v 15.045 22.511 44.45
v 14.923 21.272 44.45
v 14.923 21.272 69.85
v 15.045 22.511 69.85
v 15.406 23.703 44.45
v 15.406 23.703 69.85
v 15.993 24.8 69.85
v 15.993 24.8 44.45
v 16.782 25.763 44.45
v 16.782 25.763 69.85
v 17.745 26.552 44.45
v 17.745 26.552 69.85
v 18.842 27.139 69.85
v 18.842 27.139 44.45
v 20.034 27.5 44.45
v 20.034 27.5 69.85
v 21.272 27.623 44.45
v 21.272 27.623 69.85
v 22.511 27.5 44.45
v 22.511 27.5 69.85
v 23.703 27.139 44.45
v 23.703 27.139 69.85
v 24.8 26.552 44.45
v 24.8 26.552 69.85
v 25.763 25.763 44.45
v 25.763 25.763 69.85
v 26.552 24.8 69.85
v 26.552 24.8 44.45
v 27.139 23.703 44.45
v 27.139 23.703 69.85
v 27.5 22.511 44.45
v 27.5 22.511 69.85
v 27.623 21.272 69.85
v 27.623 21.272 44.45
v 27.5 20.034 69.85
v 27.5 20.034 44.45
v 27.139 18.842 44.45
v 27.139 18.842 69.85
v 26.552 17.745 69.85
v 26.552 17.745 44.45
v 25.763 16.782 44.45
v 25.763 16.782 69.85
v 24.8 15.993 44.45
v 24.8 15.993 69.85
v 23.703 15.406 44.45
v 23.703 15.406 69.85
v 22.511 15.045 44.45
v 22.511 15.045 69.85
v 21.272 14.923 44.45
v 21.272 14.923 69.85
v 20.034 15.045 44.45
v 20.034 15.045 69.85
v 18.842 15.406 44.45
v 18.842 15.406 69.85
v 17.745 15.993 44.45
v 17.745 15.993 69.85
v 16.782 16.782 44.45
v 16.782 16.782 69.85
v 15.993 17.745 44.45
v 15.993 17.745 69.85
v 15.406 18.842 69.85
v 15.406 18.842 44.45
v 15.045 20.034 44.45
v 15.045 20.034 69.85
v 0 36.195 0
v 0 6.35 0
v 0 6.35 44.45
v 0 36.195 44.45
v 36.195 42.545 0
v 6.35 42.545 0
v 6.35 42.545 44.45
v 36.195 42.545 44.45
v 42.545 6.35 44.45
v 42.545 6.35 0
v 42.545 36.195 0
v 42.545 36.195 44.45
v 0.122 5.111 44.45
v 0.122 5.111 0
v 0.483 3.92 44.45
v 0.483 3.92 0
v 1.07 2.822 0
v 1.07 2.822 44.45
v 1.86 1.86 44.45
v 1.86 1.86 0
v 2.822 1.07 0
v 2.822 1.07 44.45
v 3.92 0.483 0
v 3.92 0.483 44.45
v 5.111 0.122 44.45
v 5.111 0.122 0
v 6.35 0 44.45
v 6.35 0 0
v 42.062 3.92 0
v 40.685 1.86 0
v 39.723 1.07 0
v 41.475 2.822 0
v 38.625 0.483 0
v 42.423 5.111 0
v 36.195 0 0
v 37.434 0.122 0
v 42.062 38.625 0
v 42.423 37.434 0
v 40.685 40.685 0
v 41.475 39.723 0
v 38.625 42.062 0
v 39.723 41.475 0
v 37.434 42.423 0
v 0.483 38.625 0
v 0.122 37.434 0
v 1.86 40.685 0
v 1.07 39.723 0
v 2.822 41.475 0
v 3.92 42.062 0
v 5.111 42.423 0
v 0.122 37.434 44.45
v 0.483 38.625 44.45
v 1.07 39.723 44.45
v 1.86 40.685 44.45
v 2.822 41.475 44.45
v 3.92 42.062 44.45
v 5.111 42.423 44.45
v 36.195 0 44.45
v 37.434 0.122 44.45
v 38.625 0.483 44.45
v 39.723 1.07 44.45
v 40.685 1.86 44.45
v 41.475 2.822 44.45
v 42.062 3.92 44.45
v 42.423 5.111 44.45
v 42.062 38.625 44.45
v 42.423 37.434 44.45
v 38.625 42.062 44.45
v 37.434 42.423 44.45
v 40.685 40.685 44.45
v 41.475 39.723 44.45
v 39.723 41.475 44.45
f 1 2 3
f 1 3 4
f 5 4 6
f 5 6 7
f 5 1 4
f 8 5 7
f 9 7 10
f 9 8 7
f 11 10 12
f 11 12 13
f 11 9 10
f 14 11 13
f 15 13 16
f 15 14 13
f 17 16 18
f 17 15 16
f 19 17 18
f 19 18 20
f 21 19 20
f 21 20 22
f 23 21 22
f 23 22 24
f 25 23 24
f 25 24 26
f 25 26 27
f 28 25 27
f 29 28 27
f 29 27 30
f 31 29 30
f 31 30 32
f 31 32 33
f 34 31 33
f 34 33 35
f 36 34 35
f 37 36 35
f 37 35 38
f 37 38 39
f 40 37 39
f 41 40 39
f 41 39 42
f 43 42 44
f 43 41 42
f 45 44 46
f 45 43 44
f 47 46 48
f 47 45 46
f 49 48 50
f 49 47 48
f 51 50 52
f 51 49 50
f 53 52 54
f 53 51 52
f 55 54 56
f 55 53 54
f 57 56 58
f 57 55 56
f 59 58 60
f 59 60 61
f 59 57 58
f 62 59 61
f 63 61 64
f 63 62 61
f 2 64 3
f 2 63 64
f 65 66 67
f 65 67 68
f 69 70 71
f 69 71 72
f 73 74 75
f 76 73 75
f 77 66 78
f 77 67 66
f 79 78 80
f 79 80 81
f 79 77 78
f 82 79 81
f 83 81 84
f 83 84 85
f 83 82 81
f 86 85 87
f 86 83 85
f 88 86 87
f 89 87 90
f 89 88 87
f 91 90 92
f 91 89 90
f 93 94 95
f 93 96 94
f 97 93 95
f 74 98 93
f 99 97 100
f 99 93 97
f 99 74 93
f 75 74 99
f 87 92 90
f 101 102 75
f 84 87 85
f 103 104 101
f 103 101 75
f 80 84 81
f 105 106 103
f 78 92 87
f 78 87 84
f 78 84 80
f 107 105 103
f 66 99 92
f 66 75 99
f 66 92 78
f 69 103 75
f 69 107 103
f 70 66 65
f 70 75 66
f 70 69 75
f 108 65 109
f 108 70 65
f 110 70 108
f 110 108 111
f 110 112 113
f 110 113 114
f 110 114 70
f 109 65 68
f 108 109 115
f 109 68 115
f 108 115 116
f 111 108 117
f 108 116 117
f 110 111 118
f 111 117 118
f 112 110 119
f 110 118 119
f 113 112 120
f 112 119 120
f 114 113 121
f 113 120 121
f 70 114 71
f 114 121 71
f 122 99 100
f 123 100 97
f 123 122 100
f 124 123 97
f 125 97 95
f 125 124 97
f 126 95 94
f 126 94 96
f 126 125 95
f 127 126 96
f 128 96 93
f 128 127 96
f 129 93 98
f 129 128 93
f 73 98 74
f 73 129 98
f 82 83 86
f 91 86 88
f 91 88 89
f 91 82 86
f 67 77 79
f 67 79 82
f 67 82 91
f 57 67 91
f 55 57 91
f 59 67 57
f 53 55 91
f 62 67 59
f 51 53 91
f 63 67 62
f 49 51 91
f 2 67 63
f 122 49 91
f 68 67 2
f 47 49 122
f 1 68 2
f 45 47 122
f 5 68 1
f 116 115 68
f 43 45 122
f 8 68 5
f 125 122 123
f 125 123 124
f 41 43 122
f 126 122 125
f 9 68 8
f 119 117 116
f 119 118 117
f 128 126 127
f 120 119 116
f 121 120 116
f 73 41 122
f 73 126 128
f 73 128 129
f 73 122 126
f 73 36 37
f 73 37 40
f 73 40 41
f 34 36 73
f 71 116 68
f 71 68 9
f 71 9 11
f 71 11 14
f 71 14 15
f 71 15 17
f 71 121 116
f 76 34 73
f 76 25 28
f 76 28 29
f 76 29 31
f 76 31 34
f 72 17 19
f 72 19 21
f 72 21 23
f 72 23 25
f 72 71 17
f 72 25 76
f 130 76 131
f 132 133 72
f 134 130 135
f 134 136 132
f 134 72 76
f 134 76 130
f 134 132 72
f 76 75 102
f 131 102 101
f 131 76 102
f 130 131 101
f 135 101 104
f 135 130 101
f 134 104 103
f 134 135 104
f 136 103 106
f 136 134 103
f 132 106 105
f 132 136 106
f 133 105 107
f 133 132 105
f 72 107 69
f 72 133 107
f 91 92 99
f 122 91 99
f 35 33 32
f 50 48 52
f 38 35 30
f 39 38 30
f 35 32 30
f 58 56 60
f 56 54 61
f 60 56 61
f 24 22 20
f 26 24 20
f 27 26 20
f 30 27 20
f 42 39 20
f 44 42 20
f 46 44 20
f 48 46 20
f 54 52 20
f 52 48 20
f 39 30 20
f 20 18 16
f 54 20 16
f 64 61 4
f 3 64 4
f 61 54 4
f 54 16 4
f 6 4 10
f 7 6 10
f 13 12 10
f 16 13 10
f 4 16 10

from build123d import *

# Parameters (mm, degrees)
SKETCH1_W           = 42.545
SKETCH1_H           = 42.545
BOSS_EXTRUDE1_DEPTH = 44.45
FILLET2_R           = 6.35
SKETCH2_R           = 6.35
BOSS_EXTRUDE2_DEPTH = 69.85


with BuildPart() as part:
    # Sketch1 → Boss-Extrude1 (new body)
    with BuildSketch(Plane.XY):
        with Locations((21.2725, 21.2725)):
            Rectangle(SKETCH1_W, SKETCH1_H)
    extrude(amount=BOSS_EXTRUDE1_DEPTH)

    # Fillet2
    fillet2_edges = [part.edges().sort_by_distance(p)[0] for p in [
        (0, 42.545, 22.225),
        (42.545, 42.545, 22.225),
        (42.545, 0, 22.225),
        (0, 0, 22.225),
    ]]
    fillet(fillet2_edges, radius=FILLET2_R)

    # Sketch2 → Boss-Extrude2 (add)
    with BuildSketch(Plane(origin=(0, 0, 0), x_dir=(-1, 0, 0), z_dir=(0, 0, -1))):
        with Locations((-21.2725, 21.2725)):
            Circle(SKETCH2_R)
    extrude(amount=-BOSS_EXTRUDE2_DEPTH)


solid = part.part
